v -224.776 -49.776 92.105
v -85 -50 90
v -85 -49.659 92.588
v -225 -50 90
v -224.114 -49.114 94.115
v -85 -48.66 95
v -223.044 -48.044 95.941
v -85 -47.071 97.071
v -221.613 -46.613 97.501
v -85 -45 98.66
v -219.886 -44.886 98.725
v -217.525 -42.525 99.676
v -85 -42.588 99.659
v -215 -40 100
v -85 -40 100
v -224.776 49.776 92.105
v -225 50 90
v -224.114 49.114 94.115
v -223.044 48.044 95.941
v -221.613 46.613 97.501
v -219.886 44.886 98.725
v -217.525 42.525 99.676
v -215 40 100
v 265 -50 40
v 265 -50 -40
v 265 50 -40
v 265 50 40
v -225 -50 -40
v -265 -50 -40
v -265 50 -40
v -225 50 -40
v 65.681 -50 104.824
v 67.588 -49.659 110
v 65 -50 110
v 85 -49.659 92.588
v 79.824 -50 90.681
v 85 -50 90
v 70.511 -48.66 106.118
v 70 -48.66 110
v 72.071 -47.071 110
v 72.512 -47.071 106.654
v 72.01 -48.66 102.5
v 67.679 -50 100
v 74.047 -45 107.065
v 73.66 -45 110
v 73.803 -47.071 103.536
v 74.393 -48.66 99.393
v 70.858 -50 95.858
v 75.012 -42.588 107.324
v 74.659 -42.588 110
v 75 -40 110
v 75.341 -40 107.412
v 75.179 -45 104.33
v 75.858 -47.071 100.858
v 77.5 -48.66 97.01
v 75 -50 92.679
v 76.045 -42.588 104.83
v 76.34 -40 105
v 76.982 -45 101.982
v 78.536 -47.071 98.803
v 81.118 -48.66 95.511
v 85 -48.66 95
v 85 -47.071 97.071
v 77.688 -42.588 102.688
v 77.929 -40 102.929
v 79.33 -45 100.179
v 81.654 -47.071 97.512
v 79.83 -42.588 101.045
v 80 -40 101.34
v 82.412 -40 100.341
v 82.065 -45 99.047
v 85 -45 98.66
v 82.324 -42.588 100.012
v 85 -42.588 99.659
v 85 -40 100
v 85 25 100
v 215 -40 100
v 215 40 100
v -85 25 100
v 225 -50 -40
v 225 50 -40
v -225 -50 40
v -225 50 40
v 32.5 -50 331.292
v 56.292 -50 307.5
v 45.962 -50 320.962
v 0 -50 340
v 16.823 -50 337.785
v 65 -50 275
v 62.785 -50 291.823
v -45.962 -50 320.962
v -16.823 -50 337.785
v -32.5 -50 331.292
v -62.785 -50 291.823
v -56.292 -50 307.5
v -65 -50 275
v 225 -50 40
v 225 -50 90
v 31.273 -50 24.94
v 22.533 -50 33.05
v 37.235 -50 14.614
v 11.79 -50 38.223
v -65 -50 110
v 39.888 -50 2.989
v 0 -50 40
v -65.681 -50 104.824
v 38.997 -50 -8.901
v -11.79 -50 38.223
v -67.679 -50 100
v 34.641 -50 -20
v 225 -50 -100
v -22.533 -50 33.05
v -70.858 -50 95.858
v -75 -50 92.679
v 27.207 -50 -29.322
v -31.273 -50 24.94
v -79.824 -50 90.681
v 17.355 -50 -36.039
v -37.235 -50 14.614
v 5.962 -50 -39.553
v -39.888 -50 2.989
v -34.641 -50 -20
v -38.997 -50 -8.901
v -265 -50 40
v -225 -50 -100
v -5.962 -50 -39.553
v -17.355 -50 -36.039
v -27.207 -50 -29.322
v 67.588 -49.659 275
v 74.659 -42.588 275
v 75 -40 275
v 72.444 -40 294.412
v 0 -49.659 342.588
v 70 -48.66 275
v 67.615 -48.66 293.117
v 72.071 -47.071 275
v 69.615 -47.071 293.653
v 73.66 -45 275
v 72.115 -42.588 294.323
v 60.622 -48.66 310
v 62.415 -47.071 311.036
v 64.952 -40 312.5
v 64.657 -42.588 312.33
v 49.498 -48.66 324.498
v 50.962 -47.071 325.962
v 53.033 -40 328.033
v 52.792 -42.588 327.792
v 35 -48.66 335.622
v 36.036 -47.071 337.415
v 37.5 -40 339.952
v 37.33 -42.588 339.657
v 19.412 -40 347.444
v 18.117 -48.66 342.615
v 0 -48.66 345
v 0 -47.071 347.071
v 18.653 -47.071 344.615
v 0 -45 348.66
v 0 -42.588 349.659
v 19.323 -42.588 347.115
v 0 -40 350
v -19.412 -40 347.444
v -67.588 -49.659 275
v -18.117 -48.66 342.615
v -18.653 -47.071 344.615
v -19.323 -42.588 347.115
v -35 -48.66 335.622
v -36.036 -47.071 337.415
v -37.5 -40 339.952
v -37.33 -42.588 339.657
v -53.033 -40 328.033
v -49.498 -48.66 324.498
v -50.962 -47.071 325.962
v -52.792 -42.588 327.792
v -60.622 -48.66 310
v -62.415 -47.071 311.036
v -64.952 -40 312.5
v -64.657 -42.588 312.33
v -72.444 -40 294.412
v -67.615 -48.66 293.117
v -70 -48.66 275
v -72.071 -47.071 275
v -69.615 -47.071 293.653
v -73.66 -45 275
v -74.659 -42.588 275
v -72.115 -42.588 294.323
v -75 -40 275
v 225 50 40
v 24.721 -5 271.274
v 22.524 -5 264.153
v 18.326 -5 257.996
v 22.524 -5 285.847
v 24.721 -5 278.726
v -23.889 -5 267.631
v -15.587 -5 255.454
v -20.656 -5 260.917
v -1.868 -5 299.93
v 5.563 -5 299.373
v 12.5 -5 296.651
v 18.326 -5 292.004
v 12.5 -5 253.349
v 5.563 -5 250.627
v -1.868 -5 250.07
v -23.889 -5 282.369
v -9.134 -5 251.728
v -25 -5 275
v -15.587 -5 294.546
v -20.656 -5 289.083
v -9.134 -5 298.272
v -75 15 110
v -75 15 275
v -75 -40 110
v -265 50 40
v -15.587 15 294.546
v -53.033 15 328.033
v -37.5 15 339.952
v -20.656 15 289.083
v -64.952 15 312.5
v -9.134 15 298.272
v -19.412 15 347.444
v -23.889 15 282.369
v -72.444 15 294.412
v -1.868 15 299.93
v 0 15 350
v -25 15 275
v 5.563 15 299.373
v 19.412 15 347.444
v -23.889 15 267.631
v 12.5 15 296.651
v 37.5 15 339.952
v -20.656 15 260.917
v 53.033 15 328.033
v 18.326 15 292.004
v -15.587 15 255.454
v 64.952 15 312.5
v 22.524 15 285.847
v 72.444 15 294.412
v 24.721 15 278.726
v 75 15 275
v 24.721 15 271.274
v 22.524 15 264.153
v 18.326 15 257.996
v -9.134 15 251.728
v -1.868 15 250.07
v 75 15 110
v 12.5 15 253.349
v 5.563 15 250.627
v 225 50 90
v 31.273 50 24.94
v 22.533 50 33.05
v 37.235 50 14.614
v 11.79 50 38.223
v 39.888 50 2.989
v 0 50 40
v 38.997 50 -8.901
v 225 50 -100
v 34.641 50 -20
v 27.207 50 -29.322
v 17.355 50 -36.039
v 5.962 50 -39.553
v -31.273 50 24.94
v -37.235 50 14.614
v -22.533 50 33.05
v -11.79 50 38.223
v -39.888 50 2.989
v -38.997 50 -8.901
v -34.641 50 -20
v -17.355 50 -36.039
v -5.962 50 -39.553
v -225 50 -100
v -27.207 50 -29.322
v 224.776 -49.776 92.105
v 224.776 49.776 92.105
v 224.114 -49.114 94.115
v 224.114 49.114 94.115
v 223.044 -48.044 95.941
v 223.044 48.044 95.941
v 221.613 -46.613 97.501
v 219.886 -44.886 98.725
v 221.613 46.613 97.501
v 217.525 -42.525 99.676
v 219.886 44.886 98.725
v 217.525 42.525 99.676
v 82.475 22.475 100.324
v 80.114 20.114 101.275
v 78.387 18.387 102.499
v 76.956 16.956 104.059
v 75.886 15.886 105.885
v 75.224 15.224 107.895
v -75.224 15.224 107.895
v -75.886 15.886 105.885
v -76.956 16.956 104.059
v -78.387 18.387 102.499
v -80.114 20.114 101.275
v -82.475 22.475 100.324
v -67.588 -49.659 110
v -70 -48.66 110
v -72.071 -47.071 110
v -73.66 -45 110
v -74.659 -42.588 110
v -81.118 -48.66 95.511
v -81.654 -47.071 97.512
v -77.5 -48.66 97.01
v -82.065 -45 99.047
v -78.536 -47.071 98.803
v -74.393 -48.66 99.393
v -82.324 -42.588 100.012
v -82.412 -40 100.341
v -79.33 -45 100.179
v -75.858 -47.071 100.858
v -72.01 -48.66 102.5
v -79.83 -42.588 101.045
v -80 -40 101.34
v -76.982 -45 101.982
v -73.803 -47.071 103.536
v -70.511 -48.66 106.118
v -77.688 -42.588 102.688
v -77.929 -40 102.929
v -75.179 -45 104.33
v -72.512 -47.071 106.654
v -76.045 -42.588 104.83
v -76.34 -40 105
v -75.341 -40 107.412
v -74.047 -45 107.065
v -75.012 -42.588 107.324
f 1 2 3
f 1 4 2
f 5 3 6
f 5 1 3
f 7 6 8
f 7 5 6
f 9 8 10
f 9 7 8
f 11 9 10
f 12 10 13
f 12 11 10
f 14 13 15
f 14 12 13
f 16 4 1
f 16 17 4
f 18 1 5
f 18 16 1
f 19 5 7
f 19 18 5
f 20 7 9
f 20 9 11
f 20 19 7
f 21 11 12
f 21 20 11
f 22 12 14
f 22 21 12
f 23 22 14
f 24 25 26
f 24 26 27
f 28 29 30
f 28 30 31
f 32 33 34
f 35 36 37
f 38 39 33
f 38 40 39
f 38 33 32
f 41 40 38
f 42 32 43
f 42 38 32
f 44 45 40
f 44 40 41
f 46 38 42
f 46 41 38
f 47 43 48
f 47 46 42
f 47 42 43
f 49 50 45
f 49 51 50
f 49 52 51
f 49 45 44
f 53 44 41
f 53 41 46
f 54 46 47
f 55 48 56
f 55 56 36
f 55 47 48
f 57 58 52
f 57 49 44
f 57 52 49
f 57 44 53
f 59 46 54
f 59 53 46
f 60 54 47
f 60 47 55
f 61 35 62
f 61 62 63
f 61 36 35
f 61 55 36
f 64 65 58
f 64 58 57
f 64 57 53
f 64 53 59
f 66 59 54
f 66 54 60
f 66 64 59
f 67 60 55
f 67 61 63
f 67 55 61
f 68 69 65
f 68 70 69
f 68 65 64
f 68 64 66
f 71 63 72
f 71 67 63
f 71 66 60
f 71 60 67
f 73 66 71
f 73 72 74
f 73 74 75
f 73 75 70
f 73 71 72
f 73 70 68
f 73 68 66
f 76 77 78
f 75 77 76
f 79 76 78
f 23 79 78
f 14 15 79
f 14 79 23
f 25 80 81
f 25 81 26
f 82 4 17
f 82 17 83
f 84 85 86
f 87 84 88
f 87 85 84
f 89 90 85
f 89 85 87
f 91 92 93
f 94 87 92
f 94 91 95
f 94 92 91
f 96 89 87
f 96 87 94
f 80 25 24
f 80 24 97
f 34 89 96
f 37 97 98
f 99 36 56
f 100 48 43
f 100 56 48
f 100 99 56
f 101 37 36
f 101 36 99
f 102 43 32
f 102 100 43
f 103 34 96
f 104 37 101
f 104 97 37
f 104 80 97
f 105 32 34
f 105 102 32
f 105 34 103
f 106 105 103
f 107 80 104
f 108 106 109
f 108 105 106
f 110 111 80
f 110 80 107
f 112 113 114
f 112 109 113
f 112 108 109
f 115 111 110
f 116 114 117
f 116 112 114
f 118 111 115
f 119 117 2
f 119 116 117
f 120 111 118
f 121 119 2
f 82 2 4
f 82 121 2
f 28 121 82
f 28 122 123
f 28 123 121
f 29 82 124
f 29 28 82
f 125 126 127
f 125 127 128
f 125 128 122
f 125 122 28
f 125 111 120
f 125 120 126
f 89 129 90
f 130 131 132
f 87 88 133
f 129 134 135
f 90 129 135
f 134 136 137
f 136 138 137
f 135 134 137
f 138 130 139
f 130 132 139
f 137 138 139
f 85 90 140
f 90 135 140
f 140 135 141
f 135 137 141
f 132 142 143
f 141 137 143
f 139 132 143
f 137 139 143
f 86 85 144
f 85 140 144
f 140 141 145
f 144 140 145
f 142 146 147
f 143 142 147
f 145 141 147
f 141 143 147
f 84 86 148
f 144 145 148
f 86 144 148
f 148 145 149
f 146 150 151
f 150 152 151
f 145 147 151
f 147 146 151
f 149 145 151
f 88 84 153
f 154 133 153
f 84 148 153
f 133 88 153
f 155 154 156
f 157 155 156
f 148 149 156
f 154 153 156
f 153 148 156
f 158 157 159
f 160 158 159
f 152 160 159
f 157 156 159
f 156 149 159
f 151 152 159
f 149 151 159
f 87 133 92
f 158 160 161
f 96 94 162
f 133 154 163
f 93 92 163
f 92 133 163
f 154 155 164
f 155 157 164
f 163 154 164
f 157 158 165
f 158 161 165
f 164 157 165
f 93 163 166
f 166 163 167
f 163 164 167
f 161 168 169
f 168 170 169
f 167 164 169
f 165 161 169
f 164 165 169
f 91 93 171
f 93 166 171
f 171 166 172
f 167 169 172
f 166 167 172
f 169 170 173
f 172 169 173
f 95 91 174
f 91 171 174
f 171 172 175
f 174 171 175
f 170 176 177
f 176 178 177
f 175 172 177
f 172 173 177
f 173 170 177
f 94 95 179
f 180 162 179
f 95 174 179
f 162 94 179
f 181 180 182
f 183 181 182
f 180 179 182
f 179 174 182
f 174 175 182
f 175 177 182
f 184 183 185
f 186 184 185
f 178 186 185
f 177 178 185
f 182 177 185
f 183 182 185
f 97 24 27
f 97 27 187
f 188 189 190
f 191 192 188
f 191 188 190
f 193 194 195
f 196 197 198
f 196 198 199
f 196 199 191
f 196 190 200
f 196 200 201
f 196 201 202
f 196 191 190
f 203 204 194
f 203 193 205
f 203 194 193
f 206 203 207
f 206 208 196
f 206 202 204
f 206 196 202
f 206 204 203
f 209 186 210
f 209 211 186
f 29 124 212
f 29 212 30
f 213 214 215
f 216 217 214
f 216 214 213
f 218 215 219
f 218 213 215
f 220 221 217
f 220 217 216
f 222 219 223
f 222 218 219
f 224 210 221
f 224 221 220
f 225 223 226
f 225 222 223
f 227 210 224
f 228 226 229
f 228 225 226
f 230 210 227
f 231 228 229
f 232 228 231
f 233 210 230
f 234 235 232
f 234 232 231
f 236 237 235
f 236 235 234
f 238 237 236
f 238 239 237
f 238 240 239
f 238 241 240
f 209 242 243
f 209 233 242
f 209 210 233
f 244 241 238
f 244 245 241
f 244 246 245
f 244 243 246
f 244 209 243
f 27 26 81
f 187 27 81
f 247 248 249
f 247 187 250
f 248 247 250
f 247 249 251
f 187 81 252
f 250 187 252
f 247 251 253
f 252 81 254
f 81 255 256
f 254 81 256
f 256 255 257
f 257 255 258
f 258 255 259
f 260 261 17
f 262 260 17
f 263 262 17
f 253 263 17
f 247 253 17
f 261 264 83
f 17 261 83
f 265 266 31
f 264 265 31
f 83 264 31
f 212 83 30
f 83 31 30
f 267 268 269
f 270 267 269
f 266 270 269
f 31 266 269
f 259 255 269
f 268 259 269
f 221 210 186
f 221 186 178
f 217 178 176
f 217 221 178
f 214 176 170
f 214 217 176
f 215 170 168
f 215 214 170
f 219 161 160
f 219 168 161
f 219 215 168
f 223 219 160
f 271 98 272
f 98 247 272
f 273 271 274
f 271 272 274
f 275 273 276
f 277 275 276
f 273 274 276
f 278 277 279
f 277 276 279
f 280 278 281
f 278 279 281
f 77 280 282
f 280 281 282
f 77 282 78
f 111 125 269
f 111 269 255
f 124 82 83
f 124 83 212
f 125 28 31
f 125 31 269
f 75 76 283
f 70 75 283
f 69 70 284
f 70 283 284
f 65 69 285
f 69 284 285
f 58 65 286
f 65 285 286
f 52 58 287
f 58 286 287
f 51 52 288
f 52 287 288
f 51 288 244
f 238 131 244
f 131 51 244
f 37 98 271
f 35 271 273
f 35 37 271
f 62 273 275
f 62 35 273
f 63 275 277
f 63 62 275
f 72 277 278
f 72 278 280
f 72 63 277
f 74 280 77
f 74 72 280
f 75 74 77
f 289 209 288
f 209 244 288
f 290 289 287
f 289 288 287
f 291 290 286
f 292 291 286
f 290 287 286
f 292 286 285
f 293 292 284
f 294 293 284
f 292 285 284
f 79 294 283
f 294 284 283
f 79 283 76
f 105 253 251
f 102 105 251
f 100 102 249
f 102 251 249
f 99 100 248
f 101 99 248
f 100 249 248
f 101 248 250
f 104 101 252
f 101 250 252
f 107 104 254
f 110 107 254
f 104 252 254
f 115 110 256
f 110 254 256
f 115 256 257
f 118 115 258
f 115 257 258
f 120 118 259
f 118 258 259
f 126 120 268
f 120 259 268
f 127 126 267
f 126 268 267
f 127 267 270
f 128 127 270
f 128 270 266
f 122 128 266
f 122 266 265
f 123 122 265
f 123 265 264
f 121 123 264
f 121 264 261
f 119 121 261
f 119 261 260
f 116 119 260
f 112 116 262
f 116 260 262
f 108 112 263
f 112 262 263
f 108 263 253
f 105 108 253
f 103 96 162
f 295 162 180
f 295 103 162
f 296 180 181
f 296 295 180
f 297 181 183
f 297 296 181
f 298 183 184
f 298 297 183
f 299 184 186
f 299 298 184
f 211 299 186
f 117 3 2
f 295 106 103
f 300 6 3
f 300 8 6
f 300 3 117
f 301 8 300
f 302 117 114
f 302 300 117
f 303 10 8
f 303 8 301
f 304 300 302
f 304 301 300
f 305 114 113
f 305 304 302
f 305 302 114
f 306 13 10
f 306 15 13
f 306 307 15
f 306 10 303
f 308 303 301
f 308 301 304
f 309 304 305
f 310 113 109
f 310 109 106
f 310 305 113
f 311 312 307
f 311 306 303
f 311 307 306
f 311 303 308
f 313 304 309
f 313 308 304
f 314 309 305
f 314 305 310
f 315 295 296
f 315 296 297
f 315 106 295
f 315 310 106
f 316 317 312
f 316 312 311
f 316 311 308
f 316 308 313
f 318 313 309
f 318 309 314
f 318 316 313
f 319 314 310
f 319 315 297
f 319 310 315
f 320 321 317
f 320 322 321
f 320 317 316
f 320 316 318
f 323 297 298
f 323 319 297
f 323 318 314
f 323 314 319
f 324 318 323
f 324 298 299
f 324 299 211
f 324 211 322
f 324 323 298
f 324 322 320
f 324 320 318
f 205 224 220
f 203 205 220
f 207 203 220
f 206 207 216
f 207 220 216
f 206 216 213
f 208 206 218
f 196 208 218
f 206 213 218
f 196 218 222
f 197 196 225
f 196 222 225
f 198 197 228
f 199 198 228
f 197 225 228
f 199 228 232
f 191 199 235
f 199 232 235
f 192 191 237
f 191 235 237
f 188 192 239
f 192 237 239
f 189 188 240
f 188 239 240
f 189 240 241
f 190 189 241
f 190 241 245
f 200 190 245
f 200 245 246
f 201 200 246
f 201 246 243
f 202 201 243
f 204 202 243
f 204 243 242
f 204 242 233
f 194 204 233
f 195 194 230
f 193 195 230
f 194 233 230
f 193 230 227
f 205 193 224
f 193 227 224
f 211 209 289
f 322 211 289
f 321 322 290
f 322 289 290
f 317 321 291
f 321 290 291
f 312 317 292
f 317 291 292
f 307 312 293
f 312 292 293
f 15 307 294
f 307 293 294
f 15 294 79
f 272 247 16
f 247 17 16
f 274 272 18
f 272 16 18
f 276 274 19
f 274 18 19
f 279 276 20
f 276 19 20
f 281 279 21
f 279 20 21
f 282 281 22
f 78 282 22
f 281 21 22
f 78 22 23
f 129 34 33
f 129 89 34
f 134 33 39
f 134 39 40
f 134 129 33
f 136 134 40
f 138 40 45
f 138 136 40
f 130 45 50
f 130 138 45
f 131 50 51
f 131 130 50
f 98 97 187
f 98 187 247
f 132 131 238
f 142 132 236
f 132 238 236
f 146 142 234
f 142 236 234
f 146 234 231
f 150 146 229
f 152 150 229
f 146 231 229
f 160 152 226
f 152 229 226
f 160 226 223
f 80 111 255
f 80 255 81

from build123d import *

# Parameters (mm, degrees)
AUFSATZ_LINEAR_AUSTRAGEN1_DEPTH      = 50
AUFSATZ_LINEAR_AUSTRAGEN1_DEPTH_BACK = 50
SKIZZE4_R                            = 40
SCHNITT_LINEAR_AUSTRAGEN1_DEPTH      = 100
SKIZZE5_W                            = 150
SKIZZE5_H                            = 100
AUFSATZ_LINEAR_AUSTRAGEN2_DEPTH      = 250
VERRUNDUNG2_R                        = 75
SCHNITT_LINEAR_AUSTRAGEN3_REACH      = 492.51
SKIZZE8_W                            = 120
SKIZZE8_H                            = 35
SKIZZE9_R                            = 25
SCHNITT_LINEAR_AUSTRAGEN4_DEPTH      = 20
SKIZZE10_W                           = 150
SKIZZE10_H                           = 130
SCHNITT_LINEAR_AUSTRAGEN5_DEPTH      = 35
VERRUNDUNG3_R                        = 10


with BuildPart() as part:
    # Skizze3 → Aufsatz-Linear austragen1 (new, two sides: drawn at the far end of the back side and taken through both)
    with BuildSketch(Plane(origin=(0, 0, 0), x_dir=(1, 0, 0), z_dir=(0, 1, 0)).offset(-AUFSATZ_LINEAR_AUSTRAGEN1_DEPTH_BACK)):
        Polygon((-265, -40), (-265, 40), (-225, 40), (-225, 100), (225, 100), (225, 40), (265, 40), (265, -40), (225, -40), (225, -100), (-225, -100), (-225, -40), align=None)
    extrude(amount=AUFSATZ_LINEAR_AUSTRAGEN1_DEPTH + AUFSATZ_LINEAR_AUSTRAGEN1_DEPTH_BACK)

    # Skizze4 → Schnitt-Linear austragen1 (cut)
    with BuildSketch(Plane(origin=(0, 50, 0), x_dir=(1, 0, 0), z_dir=(0, 1, 0))):
        with Locations(Location((0, 0, 0), (0, 0, 270))):
            Circle(SKIZZE4_R)
    extrude(amount=-SCHNITT_LINEAR_AUSTRAGEN1_DEPTH, mode=Mode.SUBTRACT)

    # Skizze5 → Aufsatz-Linear austragen2 (add)
    with BuildSketch(Plane.XY.offset(100)):
        Rectangle(SKIZZE5_W, SKIZZE5_H)
    extrude(amount=AUFSATZ_LINEAR_AUSTRAGEN2_DEPTH)

    # Verrundung2
    verrundung2_edges = [part.edges().sort_by_distance(p)[0] for p in [
        (-75, 0, 350),
        (75, 0, 350),
    ]]
    fillet(verrundung2_edges, radius=VERRUNDUNG2_R - 0.0001)  # a hair under: the kernel refuses the full size

    # Schnitt-Linear austragen3: up to this face of the body (flat: up to its plane)
    schnitt_linear_austragen3_end = Plane(part.part.faces().sort_by_distance((-75, 0, 187.50005))[0])
    # Skizze8 → Schnitt-Linear austragen3 (cut, up to the picked face)
    with BuildSketch(Plane(origin=(75, 0, 0), x_dir=(0, 0, -1), z_dir=(1, 0, 0)), mode=Mode.PRIVATE) as schnitt_linear_austragen3_sk1:
        with Locations((-290, 32.5)):
            Rectangle(SKIZZE8_W, SKIZZE8_H)
    schnitt_linear_austragen3_tool1 = split(extrude(schnitt_linear_austragen3_sk1.sketch, amount=-SCHNITT_LINEAR_AUSTRAGEN3_REACH, mode=Mode.PRIVATE), bisect_by=schnitt_linear_austragen3_end, keep=Keep.BOTH, mode=Mode.PRIVATE)
    add(schnitt_linear_austragen3_tool1.solids().sort_by(Axis((75, 32.5, 290), (-1, 0, 0)))[0], mode=Mode.SUBTRACT)

    # Skizze9 → Schnitt-Linear austragen4 (cut)
    with BuildSketch(Plane(origin=(0, 15, 0), x_dir=(1, 0, 0), z_dir=(0, 1, 0))):
        with Locations(Location((0, -275, 0), (0, 0, 180))):
            Circle(SKIZZE9_R)
    extrude(amount=-SCHNITT_LINEAR_AUSTRAGEN4_DEPTH, mode=Mode.SUBTRACT)

    # Skizze10 → Schnitt-Linear austragen5 (cut)
    with BuildSketch(Plane(origin=(0, 50, 0), x_dir=(1, 0, 0), z_dir=(0, 1, 0))):
        with Locations((0, -165)):
            Rectangle(SKIZZE10_W, SKIZZE10_H)
    extrude(amount=-SCHNITT_LINEAR_AUSTRAGEN5_DEPTH, mode=Mode.SUBTRACT)

    # Verrundung3
    verrundung3_edges = [part.edges().sort_by_distance(p)[0] for p in [
        (-75, -17.5, 100),
        (0, 15, 100),
        (-150, -50, 100),
        (225, 0, 100),
        (-225, 0, 100),
        (0, 50, 100),
        (150, -50, 100),
        (75, -17.5, 100),
        (75, -50, 187.50005),
        (-75, -50, 187.50005),
        (53.033037878, -50, 328.033037878),
        (-53.033037878, -50, 328.033037878),
    ]]
    fillet(verrundung3_edges, radius=VERRUNDUNG3_R)


solid = part.part
